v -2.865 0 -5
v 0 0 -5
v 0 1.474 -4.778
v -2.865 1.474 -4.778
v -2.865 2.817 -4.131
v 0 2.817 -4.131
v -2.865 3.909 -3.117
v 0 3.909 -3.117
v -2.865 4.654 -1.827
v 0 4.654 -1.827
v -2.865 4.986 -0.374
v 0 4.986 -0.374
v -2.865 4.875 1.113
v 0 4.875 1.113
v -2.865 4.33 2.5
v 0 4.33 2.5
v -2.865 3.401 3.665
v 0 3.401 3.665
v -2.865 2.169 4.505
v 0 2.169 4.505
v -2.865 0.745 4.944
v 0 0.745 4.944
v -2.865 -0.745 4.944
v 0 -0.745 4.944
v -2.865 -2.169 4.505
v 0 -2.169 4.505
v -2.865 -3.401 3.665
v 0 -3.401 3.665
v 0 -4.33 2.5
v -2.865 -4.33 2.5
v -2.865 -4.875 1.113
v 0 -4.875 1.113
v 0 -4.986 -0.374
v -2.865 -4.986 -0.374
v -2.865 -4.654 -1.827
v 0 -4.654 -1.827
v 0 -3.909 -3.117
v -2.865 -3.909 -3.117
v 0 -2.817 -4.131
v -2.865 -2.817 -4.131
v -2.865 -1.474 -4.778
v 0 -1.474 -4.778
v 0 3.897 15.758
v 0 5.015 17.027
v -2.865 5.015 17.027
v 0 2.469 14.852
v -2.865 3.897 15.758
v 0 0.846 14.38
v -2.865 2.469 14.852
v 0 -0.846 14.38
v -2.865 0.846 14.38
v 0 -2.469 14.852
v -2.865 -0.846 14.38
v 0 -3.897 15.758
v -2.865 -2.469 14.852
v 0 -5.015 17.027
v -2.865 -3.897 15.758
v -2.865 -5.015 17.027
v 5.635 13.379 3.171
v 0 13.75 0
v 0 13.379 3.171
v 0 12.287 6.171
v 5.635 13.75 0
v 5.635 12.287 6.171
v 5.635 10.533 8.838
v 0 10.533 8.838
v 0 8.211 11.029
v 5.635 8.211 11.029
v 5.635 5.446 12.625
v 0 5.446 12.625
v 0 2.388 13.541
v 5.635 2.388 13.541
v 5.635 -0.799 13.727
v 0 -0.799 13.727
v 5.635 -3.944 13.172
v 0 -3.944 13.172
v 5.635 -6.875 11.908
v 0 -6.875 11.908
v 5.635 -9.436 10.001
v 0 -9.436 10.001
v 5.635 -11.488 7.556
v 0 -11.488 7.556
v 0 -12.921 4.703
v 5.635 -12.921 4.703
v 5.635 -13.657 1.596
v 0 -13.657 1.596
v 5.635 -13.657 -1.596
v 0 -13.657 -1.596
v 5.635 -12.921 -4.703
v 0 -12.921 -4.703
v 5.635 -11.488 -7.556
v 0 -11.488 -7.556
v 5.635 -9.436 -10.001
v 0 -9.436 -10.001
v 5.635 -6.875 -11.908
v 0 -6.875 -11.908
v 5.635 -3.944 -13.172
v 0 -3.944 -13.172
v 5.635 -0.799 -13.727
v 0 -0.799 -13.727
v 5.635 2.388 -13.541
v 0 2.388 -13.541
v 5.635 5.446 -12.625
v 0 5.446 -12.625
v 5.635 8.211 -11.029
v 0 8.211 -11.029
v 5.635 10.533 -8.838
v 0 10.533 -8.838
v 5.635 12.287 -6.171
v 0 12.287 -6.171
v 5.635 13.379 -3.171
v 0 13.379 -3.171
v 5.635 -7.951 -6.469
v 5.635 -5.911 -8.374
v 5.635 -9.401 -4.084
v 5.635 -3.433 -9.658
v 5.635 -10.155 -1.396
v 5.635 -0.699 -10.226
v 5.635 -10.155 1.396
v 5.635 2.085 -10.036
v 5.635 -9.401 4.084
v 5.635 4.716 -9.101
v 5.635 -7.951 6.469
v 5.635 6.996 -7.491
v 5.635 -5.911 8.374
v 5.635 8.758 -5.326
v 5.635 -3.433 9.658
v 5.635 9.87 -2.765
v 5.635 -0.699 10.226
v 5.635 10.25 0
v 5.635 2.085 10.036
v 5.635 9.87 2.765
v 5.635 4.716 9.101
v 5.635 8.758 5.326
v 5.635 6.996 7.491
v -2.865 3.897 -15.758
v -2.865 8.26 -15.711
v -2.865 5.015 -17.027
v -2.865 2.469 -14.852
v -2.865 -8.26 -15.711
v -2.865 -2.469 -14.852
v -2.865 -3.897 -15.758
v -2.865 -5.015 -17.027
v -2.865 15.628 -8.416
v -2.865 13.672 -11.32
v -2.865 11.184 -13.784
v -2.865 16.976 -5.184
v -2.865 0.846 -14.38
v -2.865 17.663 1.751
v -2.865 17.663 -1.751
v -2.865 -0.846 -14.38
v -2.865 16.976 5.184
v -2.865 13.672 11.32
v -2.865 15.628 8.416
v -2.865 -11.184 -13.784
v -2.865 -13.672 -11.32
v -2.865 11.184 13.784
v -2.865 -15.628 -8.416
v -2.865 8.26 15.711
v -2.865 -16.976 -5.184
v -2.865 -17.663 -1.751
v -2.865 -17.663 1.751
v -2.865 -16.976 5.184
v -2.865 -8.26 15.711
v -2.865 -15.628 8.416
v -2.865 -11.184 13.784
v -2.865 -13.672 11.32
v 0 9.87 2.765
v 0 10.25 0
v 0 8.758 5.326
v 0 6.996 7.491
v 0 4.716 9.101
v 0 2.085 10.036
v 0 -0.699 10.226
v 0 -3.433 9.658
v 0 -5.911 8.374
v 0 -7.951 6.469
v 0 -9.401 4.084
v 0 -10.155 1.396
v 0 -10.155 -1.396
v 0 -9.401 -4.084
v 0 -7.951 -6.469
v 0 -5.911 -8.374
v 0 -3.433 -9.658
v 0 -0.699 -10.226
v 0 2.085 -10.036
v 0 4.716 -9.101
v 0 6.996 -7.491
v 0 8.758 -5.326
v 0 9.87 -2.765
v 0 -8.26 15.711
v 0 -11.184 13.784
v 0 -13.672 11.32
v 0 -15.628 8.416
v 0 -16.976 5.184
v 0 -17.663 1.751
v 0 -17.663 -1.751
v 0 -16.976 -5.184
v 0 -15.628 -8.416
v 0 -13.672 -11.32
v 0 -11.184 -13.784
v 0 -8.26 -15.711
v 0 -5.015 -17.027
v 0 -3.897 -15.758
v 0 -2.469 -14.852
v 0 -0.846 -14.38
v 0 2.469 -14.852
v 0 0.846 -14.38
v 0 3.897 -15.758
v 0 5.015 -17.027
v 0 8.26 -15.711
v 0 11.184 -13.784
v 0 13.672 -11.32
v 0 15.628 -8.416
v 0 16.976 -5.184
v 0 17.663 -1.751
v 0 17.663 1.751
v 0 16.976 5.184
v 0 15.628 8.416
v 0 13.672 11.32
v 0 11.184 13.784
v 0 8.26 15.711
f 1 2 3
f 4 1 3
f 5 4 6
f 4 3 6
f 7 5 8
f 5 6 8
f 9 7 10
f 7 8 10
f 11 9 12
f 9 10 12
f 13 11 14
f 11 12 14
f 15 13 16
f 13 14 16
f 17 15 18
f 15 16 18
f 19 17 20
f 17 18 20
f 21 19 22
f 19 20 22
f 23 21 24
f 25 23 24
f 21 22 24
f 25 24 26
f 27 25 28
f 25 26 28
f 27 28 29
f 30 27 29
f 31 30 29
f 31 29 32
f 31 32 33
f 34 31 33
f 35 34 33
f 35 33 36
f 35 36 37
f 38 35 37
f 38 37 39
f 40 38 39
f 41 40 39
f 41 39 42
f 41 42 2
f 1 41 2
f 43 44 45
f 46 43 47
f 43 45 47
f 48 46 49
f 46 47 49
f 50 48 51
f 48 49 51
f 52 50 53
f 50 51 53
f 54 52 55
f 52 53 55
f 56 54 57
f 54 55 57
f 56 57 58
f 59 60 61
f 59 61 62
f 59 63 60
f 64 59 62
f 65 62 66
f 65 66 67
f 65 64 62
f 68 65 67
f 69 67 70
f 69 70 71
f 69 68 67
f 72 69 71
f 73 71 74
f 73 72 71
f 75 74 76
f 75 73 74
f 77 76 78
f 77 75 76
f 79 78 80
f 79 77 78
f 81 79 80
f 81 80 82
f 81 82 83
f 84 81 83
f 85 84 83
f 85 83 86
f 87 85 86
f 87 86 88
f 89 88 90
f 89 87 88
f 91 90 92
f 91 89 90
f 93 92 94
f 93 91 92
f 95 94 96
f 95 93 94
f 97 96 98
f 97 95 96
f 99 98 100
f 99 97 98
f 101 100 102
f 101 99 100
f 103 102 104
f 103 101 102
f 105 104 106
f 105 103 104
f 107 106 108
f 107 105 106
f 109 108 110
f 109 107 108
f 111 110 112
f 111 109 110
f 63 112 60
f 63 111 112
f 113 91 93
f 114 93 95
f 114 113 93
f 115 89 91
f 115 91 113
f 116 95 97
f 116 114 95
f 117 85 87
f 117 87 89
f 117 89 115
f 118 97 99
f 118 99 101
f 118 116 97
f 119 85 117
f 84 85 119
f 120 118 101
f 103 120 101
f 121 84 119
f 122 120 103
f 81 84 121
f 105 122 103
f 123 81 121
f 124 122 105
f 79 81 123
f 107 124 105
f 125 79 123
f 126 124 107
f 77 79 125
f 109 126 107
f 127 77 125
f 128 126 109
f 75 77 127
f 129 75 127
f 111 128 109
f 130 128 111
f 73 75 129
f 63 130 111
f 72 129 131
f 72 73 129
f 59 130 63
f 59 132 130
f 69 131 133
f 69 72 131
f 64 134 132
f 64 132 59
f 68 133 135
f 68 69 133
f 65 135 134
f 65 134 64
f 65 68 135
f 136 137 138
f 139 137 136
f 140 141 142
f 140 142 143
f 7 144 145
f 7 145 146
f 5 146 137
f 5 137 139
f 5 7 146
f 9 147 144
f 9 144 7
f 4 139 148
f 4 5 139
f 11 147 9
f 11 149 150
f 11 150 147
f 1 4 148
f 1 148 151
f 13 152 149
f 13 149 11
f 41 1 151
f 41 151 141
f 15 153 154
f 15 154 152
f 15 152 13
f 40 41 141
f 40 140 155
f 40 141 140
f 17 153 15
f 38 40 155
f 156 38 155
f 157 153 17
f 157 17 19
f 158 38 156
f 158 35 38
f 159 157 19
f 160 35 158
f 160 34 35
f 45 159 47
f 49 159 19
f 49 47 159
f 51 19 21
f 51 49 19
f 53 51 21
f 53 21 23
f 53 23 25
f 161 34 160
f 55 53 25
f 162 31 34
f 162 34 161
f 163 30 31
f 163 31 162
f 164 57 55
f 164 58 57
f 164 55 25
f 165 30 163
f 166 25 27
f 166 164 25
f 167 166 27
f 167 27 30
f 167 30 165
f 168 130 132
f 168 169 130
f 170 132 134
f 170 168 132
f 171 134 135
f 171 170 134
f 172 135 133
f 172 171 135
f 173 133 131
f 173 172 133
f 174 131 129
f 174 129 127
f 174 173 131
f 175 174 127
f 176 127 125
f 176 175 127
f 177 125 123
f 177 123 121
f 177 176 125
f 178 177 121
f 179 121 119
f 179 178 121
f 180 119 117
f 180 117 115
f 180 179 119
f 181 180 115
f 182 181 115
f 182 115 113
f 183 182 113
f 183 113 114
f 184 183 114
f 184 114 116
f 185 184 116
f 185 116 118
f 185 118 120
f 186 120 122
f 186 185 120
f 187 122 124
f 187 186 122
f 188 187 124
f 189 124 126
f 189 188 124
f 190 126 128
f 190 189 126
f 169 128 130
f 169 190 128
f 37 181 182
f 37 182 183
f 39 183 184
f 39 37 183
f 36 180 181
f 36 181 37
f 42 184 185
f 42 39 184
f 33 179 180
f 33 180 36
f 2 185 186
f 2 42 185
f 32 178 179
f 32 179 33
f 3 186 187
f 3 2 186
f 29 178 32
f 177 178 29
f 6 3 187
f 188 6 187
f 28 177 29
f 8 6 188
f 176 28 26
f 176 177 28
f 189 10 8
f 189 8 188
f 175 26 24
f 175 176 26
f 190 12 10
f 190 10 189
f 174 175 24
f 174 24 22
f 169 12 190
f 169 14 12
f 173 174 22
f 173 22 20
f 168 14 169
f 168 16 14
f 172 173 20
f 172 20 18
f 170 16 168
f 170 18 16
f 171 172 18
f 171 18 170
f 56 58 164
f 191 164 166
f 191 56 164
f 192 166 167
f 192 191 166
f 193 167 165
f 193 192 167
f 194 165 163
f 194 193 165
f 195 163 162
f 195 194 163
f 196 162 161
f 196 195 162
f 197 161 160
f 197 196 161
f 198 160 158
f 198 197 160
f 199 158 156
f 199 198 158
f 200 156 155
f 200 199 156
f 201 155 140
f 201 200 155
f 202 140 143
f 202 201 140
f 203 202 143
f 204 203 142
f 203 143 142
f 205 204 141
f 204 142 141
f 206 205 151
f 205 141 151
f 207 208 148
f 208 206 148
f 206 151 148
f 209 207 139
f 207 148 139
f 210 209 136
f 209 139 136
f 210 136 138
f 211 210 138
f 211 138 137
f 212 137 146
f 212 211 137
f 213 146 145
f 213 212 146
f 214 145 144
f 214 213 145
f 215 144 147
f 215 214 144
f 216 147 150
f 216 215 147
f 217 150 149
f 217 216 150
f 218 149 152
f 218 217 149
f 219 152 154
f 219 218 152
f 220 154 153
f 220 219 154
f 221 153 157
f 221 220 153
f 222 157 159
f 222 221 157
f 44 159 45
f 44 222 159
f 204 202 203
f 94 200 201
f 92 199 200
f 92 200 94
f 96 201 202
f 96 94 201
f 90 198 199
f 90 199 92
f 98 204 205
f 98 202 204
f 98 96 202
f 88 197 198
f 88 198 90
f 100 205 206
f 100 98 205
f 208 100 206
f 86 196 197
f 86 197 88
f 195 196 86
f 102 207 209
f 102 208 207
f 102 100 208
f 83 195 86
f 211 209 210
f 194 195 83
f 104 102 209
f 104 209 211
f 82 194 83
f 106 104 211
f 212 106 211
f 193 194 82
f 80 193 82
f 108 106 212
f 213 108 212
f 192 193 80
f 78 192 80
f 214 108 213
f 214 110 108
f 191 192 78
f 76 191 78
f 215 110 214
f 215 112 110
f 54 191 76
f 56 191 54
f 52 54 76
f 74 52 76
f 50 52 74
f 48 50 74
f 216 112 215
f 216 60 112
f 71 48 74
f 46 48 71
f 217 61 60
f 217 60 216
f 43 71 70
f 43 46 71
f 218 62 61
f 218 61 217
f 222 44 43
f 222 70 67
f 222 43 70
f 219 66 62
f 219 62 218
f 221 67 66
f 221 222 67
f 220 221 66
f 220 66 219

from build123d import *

# Parameters (mm, degrees)
M8_CLEARANCE_HOLE1_D     = 10
M8_CLEARANCE_HOLE1_DEPTH = 8.5
SKETCH4_R                = 6
CUT_EXTRUDE1_DEPTH       = 10


with BuildPart() as part:
    # Sketch1 → Revolve1 (revolve)
    with BuildSketch(Plane.XY):
        Polygon((-2.865, 4.25), (-2.865, 17.75), (0, 17.75), (0, 13.75), (5.635, 13.75), (5.635, 10.25), (0, 10.25), (0, 4.25), align=None)
    revolve(axis=Axis((-29.387999347, 0, 0), (1, 0, 0)))

    # M8 Clearance Hole1
    with Locations(Plane.ZY.offset(2.865)):
        with Locations((0, 0)):
            Hole(M8_CLEARANCE_HOLE1_D / 2, depth=M8_CLEARANCE_HOLE1_DEPTH)

    # Sketch4 → Cut-Extrude1 (cut)
    with BuildSketch(Plane.ZY.offset(2.865)):
        with Locations((-20.32, 0)):
            Circle(SKETCH4_R)
        with Locations((20.32, 0)):
            Circle(SKETCH4_R)
    extrude(amount=-CUT_EXTRUDE1_DEPTH, mode=Mode.SUBTRACT)


solid = part.part
